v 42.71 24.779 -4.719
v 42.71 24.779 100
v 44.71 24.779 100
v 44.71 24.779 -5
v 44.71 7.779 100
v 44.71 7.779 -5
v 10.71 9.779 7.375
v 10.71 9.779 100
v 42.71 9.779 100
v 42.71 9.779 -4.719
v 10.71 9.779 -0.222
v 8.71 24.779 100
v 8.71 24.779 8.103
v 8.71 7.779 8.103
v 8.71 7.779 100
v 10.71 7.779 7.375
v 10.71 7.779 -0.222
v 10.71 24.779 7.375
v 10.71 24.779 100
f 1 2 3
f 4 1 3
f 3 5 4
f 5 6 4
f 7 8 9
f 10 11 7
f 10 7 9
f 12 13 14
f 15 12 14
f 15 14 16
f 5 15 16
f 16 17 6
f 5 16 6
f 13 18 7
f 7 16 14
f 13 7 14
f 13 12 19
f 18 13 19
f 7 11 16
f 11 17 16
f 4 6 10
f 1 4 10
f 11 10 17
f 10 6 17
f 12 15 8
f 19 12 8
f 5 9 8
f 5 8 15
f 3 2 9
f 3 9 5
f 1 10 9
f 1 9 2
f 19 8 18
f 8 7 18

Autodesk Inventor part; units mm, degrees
ref_plane "YZ Plane" through (0, 0, 0) normal (1, 0, 0) x (0, 1, 0)
ref_plane "XZ Plane" through (0, 0, 0) normal (0, 1, 0) x (-1, 0, 0)
ref_plane "XY Plane" through (0, 0, 0) normal (0, 0, 1) x (1, 0, 0)
sketch "Sketch1" plane through (0, 0, 0) normal (0, 0, 1) x (1, 0, 0)
  line L0 (10.7104, 9.7791) -> (42.7104, 9.7791)
  line L1 (42.7104, 9.7791) -> (42.7104, 24.7791)
  line L2 (10.7104, 9.7791) -> (10.7104, 24.7791)
  line L3 (8.7104, 24.7791) -> (8.7104, 7.7791)
  line L4 (8.7104, 7.7791) -> (44.7104, 7.7791)
  line L5 (44.7104, 7.7791) -> (44.7104, 24.7791)
  line L6 (8.7104, 24.7791) -> (10.7104, 24.7791)
  line L7 (42.7104, 24.7791) -> (44.7104, 24.7791)
  point P0 (0, 0)
  dimension "d0" = 32
  dimension "d1" = 15
  dimension "d2" = 15
  dimension "d3" = 2
extrude "Extrusion1" add sketch "Sketch1" along normal blind 100 and the other way blind 5
sketch "Sketch3" plane through (10.7104, 9.7791, 100) normal (0, 1, 0) x (1, 0, 0)
  line L0 (-2, 105) -> (-2, 0) projected
  line L1 (-2, 91.8971) -> (-2, 105)
  line L2 (32, 105) -> (34, 105) projected
  line L3 (34, 105) -> (-2, 91.8971)
  line L4 (-2, 105) -> (-2, 91.8971)
  line L5 (-2, 105) -> (34, 105)
  line L6 (0, 105) -> (0, 0) projected
  line L7 (0, 92.625) -> (0, 105)
  line L8 (34, 105) -> (-2, 99.9405)
  line L9 (34, 105) -> (70.3538, 105) construction
  line L10 (-2, 99.9405) -> (-2, 105)
  point P0 (-10.7104, 100)
  point P1 (-2, 99.9405)
  point P2 (0, 100.2216)
  dimension "d15" = 20
  dimension "d16" = 172
extrude "Extrusion4" cut sketch "Sketch3" along normal through all both and the other way through all contours L5 L6 L8 L0 | L5 L2 L8 L6
extrude "Extrusion5" cut sketch "Sketch3" along normal through all both and the other way through all contours L8 L6 L3 L0
equation "\"BendRadius\" = Thickness"
equation "\"BendReliefWidth\" = Thickness"
equation "\"BendReliefDepth\" = 0.5 * Thickness"
equation "\"CornerReliefSize\" = 4 * Thickness"
equation "\"MinimumRemnant\" = 2 * Thickness"
equation "\"TransitionRadius\" = BendRadius"
equation "\"JacobiRadiusSize\" = BendRadius"
equation "\"GapSize\" = Thickness"
equation "\"Thickness\" = 0.5"
properties part number "outslide"
